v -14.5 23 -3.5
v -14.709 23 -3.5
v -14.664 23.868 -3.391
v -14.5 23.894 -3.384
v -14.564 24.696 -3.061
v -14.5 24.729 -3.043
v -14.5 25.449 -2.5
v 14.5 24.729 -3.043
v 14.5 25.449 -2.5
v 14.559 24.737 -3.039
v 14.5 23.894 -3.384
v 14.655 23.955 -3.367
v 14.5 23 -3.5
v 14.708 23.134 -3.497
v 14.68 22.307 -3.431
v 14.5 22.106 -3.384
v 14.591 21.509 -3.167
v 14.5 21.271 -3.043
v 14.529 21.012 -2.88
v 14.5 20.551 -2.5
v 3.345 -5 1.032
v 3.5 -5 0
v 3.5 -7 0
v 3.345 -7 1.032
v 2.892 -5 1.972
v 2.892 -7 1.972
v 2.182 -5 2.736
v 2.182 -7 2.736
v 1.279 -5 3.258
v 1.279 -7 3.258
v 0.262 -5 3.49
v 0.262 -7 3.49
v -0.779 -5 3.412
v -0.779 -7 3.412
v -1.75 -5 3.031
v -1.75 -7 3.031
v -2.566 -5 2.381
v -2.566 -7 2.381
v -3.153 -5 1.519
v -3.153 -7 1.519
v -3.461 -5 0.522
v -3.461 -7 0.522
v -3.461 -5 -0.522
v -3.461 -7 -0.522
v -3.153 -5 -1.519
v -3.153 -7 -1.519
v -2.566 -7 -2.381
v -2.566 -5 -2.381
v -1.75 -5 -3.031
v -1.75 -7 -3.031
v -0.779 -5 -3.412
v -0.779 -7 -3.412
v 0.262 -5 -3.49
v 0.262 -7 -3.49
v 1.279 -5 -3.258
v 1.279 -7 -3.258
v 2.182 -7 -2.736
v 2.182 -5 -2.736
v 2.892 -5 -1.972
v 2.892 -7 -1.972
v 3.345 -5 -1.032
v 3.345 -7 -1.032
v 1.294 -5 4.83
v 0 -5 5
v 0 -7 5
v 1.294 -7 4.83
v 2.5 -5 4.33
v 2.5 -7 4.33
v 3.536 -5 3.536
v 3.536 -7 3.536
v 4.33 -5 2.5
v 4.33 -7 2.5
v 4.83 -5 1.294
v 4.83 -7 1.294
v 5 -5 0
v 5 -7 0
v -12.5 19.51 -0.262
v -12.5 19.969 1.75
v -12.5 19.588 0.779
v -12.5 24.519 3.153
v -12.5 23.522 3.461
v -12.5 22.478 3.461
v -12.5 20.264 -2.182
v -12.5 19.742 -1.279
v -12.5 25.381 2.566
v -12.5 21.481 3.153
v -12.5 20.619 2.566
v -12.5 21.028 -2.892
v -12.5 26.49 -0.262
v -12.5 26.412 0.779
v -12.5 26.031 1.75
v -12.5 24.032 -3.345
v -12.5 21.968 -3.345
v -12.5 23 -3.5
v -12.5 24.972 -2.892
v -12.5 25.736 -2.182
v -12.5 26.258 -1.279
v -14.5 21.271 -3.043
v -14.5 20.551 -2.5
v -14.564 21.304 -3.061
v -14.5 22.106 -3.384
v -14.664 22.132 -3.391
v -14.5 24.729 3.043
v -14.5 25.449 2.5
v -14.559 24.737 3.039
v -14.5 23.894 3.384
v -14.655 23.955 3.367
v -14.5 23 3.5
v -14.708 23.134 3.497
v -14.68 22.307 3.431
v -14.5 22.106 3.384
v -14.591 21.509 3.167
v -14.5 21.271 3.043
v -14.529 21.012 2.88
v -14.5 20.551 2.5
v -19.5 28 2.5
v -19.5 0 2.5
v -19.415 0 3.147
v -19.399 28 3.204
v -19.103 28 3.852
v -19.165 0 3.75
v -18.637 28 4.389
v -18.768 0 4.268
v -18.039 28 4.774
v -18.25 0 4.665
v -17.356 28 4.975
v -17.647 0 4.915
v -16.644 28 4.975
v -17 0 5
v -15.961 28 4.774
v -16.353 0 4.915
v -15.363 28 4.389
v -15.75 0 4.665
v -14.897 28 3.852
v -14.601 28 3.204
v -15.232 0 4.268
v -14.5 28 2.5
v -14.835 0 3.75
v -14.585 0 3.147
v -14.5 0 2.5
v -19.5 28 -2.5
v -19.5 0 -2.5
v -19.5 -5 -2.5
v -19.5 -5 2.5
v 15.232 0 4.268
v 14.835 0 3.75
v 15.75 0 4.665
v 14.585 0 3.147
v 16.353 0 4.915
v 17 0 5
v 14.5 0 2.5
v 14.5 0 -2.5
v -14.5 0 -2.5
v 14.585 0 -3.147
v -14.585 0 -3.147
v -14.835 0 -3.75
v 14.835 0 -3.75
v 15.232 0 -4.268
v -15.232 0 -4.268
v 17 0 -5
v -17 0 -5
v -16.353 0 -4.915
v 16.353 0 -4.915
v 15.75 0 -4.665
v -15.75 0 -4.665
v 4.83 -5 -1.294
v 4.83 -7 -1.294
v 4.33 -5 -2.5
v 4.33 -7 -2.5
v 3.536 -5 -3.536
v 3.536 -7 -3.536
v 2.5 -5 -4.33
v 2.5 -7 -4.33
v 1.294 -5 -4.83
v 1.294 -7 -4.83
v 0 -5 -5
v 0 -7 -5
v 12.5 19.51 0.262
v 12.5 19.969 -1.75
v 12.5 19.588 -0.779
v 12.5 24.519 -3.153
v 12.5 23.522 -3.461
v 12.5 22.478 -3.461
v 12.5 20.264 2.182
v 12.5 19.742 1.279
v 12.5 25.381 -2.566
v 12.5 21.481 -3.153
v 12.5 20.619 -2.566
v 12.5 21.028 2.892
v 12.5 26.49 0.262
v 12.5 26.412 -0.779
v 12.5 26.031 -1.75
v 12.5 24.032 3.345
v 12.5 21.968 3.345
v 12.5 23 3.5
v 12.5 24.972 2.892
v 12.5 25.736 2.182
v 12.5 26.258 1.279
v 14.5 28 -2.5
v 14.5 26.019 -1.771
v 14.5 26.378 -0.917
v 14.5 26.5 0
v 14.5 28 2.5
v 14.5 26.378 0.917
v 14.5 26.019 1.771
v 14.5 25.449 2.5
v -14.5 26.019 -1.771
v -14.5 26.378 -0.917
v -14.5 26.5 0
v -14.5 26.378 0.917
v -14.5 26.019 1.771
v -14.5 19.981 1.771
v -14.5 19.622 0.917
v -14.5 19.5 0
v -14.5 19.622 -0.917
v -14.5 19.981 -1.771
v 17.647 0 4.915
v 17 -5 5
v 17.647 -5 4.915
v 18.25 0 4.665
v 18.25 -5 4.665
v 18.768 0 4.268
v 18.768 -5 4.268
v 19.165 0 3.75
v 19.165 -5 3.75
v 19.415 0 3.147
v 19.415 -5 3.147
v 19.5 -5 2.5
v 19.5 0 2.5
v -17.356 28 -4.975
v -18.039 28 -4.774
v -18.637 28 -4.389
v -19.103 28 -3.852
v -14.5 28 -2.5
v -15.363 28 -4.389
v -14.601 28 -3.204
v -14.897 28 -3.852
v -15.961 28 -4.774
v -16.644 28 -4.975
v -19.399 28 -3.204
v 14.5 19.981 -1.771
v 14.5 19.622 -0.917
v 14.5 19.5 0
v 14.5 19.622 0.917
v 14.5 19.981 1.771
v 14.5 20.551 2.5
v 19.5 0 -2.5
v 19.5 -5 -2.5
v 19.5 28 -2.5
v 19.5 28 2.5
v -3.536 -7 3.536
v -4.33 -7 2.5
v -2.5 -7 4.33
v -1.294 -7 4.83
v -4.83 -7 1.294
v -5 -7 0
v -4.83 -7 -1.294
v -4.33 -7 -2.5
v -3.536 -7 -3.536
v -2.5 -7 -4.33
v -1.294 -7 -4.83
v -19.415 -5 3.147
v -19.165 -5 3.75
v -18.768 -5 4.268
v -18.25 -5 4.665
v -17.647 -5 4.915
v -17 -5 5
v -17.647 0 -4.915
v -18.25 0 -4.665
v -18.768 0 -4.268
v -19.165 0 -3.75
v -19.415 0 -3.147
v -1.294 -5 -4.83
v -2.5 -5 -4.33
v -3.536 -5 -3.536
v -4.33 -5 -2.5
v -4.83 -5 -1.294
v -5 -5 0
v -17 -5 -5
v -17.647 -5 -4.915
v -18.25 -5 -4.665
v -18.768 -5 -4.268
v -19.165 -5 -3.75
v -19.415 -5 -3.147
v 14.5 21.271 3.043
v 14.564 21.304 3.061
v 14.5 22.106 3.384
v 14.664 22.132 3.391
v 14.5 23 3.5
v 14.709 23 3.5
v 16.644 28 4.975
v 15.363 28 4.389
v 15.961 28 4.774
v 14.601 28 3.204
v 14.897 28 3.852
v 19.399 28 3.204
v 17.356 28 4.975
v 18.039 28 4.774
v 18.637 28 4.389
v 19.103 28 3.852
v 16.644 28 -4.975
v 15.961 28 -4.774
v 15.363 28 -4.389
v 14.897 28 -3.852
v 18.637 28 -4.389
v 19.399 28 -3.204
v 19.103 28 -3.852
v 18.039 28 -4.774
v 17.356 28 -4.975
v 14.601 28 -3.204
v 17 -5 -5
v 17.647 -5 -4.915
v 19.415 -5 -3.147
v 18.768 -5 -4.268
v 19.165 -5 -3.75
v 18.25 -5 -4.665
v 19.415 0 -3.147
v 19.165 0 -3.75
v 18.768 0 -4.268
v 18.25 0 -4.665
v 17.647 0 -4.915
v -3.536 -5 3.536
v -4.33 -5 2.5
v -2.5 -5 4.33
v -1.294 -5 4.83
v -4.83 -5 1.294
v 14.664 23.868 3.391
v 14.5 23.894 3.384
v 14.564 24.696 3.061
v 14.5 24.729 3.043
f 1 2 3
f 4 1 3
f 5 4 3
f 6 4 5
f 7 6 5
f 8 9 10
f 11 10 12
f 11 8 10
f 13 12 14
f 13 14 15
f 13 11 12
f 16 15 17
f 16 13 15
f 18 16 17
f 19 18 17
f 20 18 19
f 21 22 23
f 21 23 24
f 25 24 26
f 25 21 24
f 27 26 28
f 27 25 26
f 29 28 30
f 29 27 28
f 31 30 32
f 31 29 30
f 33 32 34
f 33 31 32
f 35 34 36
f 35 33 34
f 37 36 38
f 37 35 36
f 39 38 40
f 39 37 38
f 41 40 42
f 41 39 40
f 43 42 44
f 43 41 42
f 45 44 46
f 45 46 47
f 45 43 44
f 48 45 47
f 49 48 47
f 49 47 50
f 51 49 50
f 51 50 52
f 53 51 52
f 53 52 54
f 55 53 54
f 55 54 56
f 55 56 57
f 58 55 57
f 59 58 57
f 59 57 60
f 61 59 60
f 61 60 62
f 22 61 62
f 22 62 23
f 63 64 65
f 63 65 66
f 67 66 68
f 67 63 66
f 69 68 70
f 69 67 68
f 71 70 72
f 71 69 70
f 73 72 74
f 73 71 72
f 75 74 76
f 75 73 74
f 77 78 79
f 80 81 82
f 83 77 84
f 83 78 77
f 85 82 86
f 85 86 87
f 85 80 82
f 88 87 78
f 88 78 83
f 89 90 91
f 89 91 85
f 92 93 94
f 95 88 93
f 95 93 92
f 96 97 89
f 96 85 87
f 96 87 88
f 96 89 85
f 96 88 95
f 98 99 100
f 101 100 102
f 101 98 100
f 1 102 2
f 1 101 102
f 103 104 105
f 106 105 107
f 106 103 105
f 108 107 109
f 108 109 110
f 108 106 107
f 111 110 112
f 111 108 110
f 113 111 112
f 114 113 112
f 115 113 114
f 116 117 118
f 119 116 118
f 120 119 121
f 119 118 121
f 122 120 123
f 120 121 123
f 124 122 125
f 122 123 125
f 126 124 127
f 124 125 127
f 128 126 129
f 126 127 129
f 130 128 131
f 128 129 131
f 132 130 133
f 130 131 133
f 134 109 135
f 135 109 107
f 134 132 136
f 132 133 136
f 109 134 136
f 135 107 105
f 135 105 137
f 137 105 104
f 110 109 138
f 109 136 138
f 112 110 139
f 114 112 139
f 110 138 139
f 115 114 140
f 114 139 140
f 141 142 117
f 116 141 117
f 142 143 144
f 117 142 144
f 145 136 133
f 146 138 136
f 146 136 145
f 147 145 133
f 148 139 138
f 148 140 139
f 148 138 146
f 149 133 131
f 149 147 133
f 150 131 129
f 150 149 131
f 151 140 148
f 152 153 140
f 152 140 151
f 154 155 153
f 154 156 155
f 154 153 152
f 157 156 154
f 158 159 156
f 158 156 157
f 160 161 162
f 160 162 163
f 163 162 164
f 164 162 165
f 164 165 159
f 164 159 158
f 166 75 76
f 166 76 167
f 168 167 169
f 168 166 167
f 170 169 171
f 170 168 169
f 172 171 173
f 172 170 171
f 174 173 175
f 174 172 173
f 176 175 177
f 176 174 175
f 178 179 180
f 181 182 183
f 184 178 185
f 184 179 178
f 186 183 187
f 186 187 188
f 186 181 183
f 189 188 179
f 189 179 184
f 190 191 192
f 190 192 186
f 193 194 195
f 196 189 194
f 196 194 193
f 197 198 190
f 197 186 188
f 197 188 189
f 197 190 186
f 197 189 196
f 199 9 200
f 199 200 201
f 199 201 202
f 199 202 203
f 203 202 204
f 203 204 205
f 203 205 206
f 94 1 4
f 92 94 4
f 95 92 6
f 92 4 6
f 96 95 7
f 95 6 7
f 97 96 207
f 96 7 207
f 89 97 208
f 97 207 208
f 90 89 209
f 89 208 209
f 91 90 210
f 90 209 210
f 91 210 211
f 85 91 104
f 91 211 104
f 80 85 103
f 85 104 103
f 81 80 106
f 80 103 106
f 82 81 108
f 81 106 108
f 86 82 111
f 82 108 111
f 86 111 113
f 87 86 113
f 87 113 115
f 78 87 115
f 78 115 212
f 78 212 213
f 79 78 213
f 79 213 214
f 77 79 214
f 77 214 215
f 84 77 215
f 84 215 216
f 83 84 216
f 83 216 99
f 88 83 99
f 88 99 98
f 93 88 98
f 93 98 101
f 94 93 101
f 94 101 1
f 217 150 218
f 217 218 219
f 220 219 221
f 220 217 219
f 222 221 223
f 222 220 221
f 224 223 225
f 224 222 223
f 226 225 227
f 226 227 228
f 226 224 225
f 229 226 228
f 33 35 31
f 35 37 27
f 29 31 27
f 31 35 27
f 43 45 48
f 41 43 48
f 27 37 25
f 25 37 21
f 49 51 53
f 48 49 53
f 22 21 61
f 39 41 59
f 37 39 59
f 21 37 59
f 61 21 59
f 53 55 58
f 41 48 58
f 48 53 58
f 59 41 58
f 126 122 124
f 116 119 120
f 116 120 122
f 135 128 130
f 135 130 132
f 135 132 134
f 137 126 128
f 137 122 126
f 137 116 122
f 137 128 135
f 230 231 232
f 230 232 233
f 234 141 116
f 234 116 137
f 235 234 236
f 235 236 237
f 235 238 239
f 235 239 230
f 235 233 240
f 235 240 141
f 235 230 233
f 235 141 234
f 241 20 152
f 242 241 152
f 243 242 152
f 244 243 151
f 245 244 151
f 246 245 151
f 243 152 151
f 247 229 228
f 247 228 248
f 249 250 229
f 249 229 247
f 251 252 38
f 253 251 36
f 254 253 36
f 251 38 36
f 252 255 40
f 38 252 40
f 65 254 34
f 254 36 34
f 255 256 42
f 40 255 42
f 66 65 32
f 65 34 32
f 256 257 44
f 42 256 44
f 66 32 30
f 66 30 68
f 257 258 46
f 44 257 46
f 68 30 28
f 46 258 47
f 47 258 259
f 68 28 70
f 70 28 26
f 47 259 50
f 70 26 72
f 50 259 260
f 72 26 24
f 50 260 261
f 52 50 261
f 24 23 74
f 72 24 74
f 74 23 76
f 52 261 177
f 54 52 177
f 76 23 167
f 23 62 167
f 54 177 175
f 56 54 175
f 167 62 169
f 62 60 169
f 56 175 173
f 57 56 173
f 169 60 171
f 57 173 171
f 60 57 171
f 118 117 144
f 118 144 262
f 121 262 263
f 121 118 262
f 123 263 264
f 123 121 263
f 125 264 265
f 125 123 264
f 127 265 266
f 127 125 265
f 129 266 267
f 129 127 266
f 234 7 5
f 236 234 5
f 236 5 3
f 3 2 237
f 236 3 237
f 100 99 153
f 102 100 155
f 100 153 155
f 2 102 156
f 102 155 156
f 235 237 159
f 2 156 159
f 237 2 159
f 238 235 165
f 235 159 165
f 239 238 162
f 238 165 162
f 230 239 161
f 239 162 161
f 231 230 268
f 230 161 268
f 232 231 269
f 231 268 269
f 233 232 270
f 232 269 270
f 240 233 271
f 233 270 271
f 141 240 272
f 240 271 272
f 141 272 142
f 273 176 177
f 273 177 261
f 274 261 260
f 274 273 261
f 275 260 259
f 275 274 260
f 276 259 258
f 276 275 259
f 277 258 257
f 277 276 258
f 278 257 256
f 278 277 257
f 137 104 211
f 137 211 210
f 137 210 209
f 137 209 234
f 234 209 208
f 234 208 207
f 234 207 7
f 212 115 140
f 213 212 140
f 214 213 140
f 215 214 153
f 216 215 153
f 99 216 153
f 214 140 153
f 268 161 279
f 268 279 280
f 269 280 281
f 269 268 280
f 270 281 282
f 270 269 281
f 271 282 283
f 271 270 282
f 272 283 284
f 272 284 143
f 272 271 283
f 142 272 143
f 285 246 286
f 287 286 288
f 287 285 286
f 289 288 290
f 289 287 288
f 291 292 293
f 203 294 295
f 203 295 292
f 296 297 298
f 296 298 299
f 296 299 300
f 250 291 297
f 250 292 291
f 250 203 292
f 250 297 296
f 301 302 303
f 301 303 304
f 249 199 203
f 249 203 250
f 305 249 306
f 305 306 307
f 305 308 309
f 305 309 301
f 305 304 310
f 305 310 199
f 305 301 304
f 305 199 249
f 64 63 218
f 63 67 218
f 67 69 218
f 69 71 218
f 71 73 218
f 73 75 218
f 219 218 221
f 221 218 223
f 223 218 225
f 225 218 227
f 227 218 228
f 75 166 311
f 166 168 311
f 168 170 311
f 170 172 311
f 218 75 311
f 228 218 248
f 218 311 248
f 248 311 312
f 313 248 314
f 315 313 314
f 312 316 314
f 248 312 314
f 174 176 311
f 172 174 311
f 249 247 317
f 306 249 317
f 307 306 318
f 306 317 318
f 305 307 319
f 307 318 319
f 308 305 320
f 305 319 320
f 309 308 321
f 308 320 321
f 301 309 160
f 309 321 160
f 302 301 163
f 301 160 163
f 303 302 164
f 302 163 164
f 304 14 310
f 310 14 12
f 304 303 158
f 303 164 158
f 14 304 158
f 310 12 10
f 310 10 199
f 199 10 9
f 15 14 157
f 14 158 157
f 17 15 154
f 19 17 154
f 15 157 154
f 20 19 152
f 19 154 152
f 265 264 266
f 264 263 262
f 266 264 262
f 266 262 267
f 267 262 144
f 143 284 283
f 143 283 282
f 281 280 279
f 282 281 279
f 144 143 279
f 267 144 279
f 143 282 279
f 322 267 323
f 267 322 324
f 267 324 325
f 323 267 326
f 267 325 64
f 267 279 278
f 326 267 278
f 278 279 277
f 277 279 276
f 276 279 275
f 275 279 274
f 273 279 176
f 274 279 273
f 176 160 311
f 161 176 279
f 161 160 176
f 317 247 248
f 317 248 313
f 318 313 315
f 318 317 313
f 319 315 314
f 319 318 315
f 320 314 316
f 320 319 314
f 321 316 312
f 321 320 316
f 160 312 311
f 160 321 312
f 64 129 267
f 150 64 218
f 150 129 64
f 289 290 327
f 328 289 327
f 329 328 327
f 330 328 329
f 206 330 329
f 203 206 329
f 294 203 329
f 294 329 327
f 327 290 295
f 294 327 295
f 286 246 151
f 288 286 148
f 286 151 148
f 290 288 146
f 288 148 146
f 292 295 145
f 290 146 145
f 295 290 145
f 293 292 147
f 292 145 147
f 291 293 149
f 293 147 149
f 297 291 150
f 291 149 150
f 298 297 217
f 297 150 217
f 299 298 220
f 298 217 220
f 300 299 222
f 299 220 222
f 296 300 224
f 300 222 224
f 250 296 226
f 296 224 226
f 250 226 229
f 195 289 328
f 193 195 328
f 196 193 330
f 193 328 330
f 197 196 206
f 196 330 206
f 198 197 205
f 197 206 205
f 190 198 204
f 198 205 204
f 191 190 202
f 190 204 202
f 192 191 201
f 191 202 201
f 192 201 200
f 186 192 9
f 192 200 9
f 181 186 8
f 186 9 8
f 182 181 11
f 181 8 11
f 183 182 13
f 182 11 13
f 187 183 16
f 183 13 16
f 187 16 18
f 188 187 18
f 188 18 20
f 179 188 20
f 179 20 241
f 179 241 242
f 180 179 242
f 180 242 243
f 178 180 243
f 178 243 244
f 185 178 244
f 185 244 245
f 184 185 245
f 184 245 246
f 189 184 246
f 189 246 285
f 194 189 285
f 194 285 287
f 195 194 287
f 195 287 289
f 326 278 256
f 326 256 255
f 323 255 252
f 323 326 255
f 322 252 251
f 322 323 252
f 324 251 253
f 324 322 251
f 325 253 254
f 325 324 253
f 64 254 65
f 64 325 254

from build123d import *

# Parameters (mm, degrees)
BOSS_EXTRU_2_DEPTH      = 5
BOSS_EXTRU_3_DEPTH      = 28
ESQUISSE3_R             = 3.5
BOSS_EXTRU_5_DEPTH      = 2
BOSS_EXTRU_5_DEPTH_BACK = 1
BOSS_EXTRU_7_DEPTH      = 7
ESQUISSE4_R             = 3.5
BOSS_EXTRU_8_DEPTH      = 2
BOSS_EXTRU_8_DEPTH_BACK = 1


with BuildPart() as part:
    # Esquisse1 → Boss.-Extru.2 (new body)
    with BuildSketch(Plane(origin=(0, 0, 0), x_dir=(1, 0, 0), z_dir=(0, 1, 0))):
        with BuildLine():
            Line((-17, -5), (17, -5))
            ThreePointArc((17, -5), (18.767766953, -4.267766953), (19.5, -2.5))
            Line((19.5, -2.5), (19.5, 2.5))
            ThreePointArc((19.5, 2.5), (18.767766953, 4.267766953), (17, 5))
            Line((17, 5), (-17, 5))
            ThreePointArc((-17, 5), (-18.767766953, 4.267766953), (-19.5, 2.5))
            Line((-19.5, 2.5), (-19.5, -2.5))
            ThreePointArc((-19.5, -2.5), (-18.767766953, -4.267766953), (-17, -5))
        make_face()
    extrude(amount=-BOSS_EXTRU_2_DEPTH)

    # Esquisse1<6> → Boss.-Extru.3 (add)
    with BuildSketch(Plane(origin=(0, 0, 0), x_dir=(1, 0, 0), z_dir=(0, 1, 0))):
        with BuildLine():
            ThreePointArc((-19.5, -2.5), (-17, -5), (-14.5, -2.5))
            Line((-14.5, -2.5), (-14.5, 2.5))
            ThreePointArc((-14.5, 2.5), (-17, 5), (-19.5, 2.5))
            Line((-19.5, 2.5), (-19.5, -2.5))
        make_face()
        with BuildLine():
            ThreePointArc((14.5, -2.5), (17, -5), (19.5, -2.5))
            Line((19.5, -2.5), (19.5, 2.5))
            ThreePointArc((19.5, 2.5), (17, 5), (14.5, 2.5))
            Line((14.5, 2.5), (14.5, -2.5))
        make_face()
    extrude(amount=BOSS_EXTRU_3_DEPTH)

    # Esquisse3 → Boss.-Extru.5 (add, two sides)
    with BuildSketch(Plane(origin=(-14.5, 0, 0), x_dir=(0, 0, -1), z_dir=(1, 0, 0))) as boss_extru_5_sk:
        with Locations((0, 23)):
            Circle(ESQUISSE3_R)
    extrude(amount=BOSS_EXTRU_5_DEPTH)
    extrude(boss_extru_5_sk.sketch, amount=-BOSS_EXTRU_5_DEPTH_BACK)

    # Esquisse1<9> → Boss.-Extru.7 (add)
    with BuildSketch(Plane(origin=(0, 0, 0), x_dir=(1, 0, 0), z_dir=(0, 1, 0))):
        with BuildLine():
            ThreePointArc((-5, 0), (-3.535533906, -3.535533906), (0, -5))
            ThreePointArc((0, -5), (3.535533906, -3.535533906), (5, 0))
            Line((5, 0), (3.5, 0))
            ThreePointArc((3.5, 0), (0, -3.5), (-3.5, 0))
            Line((-3.5, 0), (-5, 0))
        make_face()
        with BuildLine():
            Line((3.5, 0), (5, 0))
            ThreePointArc((5, 0), (3.535533906, 3.535533906), (0, 5))
            ThreePointArc((0, 5), (-3.535533906, 3.535533906), (-5, 0))
            Line((-5, 0), (-3.5, 0))
            ThreePointArc((-3.5, 0), (0, 3.5), (3.5, 0))
        make_face()
    extrude(amount=-BOSS_EXTRU_7_DEPTH)

    # Esquisse4 → Boss.-Extru.8 (add, two sides)
    with BuildSketch(Plane.ZY.offset(-14.5)) as boss_extru_8_sk:
        with Locations((0, 23)):
            Circle(ESQUISSE4_R)
    extrude(amount=BOSS_EXTRU_8_DEPTH)
    extrude(boss_extru_8_sk.sketch, amount=-BOSS_EXTRU_8_DEPTH_BACK)


solid = part.part
